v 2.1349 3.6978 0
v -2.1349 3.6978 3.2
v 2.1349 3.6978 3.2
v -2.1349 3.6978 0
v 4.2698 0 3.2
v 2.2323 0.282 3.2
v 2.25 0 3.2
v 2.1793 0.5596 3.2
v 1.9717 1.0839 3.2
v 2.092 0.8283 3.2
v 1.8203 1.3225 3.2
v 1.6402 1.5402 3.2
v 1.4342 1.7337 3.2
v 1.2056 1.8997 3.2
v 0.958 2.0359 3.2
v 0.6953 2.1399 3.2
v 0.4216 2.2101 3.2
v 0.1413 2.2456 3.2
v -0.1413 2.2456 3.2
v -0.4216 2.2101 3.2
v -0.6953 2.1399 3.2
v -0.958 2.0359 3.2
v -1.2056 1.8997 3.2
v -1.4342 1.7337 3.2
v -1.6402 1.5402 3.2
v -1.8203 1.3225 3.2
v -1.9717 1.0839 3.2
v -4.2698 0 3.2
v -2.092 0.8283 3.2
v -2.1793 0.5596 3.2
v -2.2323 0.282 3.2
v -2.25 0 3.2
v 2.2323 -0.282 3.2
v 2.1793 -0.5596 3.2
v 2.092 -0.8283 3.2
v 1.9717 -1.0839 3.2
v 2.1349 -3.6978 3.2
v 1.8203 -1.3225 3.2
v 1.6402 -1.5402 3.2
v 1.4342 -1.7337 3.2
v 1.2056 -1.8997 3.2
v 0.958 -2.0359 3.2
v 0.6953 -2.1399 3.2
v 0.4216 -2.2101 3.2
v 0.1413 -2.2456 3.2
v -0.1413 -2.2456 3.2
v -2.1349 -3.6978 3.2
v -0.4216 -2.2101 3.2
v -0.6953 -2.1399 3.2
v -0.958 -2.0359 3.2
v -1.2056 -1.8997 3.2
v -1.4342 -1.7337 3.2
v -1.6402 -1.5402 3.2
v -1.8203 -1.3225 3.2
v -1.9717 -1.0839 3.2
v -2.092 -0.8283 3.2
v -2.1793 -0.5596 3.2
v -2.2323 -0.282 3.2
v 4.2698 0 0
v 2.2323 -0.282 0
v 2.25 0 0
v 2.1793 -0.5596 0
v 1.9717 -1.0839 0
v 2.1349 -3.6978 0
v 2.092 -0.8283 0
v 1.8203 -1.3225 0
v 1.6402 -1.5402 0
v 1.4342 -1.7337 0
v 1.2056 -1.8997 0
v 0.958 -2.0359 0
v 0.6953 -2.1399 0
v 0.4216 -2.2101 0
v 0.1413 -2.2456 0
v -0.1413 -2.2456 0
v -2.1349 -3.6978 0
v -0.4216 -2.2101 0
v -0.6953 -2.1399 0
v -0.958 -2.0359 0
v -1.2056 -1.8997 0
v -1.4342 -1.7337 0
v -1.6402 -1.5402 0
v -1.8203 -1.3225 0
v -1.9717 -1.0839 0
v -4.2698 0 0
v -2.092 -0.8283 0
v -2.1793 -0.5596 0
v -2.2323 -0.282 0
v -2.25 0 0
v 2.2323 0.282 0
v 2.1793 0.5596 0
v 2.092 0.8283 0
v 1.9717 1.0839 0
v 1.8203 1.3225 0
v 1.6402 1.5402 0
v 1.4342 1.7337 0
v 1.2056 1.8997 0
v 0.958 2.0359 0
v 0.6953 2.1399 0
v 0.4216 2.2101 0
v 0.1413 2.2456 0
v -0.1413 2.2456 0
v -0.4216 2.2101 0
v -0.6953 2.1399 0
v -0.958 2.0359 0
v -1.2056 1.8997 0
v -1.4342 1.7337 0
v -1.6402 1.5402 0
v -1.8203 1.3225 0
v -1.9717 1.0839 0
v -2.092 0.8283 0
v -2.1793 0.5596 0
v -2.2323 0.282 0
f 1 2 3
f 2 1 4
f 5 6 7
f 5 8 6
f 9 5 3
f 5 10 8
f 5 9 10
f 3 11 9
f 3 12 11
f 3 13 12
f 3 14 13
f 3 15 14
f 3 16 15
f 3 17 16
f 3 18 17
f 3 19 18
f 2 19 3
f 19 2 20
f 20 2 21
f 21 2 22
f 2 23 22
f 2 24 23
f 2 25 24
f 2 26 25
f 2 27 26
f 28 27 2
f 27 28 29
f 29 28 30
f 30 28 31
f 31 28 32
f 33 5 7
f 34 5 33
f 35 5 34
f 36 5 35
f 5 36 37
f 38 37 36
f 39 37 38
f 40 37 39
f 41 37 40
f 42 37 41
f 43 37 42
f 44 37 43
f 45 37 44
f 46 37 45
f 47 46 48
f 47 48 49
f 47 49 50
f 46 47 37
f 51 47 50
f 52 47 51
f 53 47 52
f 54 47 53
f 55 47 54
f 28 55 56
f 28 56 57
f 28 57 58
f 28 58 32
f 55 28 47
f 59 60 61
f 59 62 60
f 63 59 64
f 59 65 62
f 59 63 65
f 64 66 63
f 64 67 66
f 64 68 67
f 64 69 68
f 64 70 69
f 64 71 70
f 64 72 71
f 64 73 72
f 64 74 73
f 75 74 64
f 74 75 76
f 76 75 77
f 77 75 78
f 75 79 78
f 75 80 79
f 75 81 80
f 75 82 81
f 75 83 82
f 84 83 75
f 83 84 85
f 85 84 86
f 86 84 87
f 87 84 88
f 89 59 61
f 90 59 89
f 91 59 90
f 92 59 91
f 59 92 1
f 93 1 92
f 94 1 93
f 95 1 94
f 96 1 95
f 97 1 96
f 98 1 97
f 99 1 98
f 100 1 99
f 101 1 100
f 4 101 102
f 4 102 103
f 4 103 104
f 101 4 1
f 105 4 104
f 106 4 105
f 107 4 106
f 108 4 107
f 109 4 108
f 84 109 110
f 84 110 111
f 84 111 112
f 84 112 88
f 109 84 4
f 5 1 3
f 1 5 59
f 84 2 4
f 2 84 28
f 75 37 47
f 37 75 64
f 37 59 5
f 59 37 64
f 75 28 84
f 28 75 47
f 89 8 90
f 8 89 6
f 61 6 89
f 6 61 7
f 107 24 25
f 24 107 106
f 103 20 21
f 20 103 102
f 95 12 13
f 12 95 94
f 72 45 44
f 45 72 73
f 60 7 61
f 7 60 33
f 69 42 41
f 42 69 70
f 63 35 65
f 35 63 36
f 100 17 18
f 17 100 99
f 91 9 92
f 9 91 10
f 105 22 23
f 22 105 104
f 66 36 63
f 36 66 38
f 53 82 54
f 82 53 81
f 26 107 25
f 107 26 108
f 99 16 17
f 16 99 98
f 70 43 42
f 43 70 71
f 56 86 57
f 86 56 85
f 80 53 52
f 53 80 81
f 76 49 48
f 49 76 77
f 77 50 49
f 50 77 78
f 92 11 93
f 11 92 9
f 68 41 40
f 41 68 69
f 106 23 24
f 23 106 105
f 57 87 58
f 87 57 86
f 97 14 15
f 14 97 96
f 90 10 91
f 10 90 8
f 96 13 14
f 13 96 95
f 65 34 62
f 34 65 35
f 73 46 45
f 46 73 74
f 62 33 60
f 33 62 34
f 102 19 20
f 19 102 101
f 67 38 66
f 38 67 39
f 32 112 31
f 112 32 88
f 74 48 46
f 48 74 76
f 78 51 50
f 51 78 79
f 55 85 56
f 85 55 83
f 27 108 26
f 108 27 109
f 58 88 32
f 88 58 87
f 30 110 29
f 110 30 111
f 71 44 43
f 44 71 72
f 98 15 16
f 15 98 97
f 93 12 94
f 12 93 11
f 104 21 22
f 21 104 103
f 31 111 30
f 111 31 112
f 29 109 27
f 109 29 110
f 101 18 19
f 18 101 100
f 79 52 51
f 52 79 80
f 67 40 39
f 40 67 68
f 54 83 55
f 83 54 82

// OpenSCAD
$fn = 50;


difference() {
	union() {
		translate(v = [0, 0, 0]) {
			rotate(a = [0, 0, 0]) {
				difference() {
					union() {
						linear_extrude(height = 3.2000000000) {
							polygon(points = [[4.2698000000, 0.0000000000], [2.1349000000, 3.6977552691], [-2.1349000000, 3.6977552691], [-4.2698000000, 0.0000000000], [-2.1349000000, -3.6977552691], [2.1349000000, -3.6977552691]]);
						}
					}
					union();
				}
			}
		}
	}
	union() {
		cylinder(h = 100, r = 2.2500000000);
	}
}
